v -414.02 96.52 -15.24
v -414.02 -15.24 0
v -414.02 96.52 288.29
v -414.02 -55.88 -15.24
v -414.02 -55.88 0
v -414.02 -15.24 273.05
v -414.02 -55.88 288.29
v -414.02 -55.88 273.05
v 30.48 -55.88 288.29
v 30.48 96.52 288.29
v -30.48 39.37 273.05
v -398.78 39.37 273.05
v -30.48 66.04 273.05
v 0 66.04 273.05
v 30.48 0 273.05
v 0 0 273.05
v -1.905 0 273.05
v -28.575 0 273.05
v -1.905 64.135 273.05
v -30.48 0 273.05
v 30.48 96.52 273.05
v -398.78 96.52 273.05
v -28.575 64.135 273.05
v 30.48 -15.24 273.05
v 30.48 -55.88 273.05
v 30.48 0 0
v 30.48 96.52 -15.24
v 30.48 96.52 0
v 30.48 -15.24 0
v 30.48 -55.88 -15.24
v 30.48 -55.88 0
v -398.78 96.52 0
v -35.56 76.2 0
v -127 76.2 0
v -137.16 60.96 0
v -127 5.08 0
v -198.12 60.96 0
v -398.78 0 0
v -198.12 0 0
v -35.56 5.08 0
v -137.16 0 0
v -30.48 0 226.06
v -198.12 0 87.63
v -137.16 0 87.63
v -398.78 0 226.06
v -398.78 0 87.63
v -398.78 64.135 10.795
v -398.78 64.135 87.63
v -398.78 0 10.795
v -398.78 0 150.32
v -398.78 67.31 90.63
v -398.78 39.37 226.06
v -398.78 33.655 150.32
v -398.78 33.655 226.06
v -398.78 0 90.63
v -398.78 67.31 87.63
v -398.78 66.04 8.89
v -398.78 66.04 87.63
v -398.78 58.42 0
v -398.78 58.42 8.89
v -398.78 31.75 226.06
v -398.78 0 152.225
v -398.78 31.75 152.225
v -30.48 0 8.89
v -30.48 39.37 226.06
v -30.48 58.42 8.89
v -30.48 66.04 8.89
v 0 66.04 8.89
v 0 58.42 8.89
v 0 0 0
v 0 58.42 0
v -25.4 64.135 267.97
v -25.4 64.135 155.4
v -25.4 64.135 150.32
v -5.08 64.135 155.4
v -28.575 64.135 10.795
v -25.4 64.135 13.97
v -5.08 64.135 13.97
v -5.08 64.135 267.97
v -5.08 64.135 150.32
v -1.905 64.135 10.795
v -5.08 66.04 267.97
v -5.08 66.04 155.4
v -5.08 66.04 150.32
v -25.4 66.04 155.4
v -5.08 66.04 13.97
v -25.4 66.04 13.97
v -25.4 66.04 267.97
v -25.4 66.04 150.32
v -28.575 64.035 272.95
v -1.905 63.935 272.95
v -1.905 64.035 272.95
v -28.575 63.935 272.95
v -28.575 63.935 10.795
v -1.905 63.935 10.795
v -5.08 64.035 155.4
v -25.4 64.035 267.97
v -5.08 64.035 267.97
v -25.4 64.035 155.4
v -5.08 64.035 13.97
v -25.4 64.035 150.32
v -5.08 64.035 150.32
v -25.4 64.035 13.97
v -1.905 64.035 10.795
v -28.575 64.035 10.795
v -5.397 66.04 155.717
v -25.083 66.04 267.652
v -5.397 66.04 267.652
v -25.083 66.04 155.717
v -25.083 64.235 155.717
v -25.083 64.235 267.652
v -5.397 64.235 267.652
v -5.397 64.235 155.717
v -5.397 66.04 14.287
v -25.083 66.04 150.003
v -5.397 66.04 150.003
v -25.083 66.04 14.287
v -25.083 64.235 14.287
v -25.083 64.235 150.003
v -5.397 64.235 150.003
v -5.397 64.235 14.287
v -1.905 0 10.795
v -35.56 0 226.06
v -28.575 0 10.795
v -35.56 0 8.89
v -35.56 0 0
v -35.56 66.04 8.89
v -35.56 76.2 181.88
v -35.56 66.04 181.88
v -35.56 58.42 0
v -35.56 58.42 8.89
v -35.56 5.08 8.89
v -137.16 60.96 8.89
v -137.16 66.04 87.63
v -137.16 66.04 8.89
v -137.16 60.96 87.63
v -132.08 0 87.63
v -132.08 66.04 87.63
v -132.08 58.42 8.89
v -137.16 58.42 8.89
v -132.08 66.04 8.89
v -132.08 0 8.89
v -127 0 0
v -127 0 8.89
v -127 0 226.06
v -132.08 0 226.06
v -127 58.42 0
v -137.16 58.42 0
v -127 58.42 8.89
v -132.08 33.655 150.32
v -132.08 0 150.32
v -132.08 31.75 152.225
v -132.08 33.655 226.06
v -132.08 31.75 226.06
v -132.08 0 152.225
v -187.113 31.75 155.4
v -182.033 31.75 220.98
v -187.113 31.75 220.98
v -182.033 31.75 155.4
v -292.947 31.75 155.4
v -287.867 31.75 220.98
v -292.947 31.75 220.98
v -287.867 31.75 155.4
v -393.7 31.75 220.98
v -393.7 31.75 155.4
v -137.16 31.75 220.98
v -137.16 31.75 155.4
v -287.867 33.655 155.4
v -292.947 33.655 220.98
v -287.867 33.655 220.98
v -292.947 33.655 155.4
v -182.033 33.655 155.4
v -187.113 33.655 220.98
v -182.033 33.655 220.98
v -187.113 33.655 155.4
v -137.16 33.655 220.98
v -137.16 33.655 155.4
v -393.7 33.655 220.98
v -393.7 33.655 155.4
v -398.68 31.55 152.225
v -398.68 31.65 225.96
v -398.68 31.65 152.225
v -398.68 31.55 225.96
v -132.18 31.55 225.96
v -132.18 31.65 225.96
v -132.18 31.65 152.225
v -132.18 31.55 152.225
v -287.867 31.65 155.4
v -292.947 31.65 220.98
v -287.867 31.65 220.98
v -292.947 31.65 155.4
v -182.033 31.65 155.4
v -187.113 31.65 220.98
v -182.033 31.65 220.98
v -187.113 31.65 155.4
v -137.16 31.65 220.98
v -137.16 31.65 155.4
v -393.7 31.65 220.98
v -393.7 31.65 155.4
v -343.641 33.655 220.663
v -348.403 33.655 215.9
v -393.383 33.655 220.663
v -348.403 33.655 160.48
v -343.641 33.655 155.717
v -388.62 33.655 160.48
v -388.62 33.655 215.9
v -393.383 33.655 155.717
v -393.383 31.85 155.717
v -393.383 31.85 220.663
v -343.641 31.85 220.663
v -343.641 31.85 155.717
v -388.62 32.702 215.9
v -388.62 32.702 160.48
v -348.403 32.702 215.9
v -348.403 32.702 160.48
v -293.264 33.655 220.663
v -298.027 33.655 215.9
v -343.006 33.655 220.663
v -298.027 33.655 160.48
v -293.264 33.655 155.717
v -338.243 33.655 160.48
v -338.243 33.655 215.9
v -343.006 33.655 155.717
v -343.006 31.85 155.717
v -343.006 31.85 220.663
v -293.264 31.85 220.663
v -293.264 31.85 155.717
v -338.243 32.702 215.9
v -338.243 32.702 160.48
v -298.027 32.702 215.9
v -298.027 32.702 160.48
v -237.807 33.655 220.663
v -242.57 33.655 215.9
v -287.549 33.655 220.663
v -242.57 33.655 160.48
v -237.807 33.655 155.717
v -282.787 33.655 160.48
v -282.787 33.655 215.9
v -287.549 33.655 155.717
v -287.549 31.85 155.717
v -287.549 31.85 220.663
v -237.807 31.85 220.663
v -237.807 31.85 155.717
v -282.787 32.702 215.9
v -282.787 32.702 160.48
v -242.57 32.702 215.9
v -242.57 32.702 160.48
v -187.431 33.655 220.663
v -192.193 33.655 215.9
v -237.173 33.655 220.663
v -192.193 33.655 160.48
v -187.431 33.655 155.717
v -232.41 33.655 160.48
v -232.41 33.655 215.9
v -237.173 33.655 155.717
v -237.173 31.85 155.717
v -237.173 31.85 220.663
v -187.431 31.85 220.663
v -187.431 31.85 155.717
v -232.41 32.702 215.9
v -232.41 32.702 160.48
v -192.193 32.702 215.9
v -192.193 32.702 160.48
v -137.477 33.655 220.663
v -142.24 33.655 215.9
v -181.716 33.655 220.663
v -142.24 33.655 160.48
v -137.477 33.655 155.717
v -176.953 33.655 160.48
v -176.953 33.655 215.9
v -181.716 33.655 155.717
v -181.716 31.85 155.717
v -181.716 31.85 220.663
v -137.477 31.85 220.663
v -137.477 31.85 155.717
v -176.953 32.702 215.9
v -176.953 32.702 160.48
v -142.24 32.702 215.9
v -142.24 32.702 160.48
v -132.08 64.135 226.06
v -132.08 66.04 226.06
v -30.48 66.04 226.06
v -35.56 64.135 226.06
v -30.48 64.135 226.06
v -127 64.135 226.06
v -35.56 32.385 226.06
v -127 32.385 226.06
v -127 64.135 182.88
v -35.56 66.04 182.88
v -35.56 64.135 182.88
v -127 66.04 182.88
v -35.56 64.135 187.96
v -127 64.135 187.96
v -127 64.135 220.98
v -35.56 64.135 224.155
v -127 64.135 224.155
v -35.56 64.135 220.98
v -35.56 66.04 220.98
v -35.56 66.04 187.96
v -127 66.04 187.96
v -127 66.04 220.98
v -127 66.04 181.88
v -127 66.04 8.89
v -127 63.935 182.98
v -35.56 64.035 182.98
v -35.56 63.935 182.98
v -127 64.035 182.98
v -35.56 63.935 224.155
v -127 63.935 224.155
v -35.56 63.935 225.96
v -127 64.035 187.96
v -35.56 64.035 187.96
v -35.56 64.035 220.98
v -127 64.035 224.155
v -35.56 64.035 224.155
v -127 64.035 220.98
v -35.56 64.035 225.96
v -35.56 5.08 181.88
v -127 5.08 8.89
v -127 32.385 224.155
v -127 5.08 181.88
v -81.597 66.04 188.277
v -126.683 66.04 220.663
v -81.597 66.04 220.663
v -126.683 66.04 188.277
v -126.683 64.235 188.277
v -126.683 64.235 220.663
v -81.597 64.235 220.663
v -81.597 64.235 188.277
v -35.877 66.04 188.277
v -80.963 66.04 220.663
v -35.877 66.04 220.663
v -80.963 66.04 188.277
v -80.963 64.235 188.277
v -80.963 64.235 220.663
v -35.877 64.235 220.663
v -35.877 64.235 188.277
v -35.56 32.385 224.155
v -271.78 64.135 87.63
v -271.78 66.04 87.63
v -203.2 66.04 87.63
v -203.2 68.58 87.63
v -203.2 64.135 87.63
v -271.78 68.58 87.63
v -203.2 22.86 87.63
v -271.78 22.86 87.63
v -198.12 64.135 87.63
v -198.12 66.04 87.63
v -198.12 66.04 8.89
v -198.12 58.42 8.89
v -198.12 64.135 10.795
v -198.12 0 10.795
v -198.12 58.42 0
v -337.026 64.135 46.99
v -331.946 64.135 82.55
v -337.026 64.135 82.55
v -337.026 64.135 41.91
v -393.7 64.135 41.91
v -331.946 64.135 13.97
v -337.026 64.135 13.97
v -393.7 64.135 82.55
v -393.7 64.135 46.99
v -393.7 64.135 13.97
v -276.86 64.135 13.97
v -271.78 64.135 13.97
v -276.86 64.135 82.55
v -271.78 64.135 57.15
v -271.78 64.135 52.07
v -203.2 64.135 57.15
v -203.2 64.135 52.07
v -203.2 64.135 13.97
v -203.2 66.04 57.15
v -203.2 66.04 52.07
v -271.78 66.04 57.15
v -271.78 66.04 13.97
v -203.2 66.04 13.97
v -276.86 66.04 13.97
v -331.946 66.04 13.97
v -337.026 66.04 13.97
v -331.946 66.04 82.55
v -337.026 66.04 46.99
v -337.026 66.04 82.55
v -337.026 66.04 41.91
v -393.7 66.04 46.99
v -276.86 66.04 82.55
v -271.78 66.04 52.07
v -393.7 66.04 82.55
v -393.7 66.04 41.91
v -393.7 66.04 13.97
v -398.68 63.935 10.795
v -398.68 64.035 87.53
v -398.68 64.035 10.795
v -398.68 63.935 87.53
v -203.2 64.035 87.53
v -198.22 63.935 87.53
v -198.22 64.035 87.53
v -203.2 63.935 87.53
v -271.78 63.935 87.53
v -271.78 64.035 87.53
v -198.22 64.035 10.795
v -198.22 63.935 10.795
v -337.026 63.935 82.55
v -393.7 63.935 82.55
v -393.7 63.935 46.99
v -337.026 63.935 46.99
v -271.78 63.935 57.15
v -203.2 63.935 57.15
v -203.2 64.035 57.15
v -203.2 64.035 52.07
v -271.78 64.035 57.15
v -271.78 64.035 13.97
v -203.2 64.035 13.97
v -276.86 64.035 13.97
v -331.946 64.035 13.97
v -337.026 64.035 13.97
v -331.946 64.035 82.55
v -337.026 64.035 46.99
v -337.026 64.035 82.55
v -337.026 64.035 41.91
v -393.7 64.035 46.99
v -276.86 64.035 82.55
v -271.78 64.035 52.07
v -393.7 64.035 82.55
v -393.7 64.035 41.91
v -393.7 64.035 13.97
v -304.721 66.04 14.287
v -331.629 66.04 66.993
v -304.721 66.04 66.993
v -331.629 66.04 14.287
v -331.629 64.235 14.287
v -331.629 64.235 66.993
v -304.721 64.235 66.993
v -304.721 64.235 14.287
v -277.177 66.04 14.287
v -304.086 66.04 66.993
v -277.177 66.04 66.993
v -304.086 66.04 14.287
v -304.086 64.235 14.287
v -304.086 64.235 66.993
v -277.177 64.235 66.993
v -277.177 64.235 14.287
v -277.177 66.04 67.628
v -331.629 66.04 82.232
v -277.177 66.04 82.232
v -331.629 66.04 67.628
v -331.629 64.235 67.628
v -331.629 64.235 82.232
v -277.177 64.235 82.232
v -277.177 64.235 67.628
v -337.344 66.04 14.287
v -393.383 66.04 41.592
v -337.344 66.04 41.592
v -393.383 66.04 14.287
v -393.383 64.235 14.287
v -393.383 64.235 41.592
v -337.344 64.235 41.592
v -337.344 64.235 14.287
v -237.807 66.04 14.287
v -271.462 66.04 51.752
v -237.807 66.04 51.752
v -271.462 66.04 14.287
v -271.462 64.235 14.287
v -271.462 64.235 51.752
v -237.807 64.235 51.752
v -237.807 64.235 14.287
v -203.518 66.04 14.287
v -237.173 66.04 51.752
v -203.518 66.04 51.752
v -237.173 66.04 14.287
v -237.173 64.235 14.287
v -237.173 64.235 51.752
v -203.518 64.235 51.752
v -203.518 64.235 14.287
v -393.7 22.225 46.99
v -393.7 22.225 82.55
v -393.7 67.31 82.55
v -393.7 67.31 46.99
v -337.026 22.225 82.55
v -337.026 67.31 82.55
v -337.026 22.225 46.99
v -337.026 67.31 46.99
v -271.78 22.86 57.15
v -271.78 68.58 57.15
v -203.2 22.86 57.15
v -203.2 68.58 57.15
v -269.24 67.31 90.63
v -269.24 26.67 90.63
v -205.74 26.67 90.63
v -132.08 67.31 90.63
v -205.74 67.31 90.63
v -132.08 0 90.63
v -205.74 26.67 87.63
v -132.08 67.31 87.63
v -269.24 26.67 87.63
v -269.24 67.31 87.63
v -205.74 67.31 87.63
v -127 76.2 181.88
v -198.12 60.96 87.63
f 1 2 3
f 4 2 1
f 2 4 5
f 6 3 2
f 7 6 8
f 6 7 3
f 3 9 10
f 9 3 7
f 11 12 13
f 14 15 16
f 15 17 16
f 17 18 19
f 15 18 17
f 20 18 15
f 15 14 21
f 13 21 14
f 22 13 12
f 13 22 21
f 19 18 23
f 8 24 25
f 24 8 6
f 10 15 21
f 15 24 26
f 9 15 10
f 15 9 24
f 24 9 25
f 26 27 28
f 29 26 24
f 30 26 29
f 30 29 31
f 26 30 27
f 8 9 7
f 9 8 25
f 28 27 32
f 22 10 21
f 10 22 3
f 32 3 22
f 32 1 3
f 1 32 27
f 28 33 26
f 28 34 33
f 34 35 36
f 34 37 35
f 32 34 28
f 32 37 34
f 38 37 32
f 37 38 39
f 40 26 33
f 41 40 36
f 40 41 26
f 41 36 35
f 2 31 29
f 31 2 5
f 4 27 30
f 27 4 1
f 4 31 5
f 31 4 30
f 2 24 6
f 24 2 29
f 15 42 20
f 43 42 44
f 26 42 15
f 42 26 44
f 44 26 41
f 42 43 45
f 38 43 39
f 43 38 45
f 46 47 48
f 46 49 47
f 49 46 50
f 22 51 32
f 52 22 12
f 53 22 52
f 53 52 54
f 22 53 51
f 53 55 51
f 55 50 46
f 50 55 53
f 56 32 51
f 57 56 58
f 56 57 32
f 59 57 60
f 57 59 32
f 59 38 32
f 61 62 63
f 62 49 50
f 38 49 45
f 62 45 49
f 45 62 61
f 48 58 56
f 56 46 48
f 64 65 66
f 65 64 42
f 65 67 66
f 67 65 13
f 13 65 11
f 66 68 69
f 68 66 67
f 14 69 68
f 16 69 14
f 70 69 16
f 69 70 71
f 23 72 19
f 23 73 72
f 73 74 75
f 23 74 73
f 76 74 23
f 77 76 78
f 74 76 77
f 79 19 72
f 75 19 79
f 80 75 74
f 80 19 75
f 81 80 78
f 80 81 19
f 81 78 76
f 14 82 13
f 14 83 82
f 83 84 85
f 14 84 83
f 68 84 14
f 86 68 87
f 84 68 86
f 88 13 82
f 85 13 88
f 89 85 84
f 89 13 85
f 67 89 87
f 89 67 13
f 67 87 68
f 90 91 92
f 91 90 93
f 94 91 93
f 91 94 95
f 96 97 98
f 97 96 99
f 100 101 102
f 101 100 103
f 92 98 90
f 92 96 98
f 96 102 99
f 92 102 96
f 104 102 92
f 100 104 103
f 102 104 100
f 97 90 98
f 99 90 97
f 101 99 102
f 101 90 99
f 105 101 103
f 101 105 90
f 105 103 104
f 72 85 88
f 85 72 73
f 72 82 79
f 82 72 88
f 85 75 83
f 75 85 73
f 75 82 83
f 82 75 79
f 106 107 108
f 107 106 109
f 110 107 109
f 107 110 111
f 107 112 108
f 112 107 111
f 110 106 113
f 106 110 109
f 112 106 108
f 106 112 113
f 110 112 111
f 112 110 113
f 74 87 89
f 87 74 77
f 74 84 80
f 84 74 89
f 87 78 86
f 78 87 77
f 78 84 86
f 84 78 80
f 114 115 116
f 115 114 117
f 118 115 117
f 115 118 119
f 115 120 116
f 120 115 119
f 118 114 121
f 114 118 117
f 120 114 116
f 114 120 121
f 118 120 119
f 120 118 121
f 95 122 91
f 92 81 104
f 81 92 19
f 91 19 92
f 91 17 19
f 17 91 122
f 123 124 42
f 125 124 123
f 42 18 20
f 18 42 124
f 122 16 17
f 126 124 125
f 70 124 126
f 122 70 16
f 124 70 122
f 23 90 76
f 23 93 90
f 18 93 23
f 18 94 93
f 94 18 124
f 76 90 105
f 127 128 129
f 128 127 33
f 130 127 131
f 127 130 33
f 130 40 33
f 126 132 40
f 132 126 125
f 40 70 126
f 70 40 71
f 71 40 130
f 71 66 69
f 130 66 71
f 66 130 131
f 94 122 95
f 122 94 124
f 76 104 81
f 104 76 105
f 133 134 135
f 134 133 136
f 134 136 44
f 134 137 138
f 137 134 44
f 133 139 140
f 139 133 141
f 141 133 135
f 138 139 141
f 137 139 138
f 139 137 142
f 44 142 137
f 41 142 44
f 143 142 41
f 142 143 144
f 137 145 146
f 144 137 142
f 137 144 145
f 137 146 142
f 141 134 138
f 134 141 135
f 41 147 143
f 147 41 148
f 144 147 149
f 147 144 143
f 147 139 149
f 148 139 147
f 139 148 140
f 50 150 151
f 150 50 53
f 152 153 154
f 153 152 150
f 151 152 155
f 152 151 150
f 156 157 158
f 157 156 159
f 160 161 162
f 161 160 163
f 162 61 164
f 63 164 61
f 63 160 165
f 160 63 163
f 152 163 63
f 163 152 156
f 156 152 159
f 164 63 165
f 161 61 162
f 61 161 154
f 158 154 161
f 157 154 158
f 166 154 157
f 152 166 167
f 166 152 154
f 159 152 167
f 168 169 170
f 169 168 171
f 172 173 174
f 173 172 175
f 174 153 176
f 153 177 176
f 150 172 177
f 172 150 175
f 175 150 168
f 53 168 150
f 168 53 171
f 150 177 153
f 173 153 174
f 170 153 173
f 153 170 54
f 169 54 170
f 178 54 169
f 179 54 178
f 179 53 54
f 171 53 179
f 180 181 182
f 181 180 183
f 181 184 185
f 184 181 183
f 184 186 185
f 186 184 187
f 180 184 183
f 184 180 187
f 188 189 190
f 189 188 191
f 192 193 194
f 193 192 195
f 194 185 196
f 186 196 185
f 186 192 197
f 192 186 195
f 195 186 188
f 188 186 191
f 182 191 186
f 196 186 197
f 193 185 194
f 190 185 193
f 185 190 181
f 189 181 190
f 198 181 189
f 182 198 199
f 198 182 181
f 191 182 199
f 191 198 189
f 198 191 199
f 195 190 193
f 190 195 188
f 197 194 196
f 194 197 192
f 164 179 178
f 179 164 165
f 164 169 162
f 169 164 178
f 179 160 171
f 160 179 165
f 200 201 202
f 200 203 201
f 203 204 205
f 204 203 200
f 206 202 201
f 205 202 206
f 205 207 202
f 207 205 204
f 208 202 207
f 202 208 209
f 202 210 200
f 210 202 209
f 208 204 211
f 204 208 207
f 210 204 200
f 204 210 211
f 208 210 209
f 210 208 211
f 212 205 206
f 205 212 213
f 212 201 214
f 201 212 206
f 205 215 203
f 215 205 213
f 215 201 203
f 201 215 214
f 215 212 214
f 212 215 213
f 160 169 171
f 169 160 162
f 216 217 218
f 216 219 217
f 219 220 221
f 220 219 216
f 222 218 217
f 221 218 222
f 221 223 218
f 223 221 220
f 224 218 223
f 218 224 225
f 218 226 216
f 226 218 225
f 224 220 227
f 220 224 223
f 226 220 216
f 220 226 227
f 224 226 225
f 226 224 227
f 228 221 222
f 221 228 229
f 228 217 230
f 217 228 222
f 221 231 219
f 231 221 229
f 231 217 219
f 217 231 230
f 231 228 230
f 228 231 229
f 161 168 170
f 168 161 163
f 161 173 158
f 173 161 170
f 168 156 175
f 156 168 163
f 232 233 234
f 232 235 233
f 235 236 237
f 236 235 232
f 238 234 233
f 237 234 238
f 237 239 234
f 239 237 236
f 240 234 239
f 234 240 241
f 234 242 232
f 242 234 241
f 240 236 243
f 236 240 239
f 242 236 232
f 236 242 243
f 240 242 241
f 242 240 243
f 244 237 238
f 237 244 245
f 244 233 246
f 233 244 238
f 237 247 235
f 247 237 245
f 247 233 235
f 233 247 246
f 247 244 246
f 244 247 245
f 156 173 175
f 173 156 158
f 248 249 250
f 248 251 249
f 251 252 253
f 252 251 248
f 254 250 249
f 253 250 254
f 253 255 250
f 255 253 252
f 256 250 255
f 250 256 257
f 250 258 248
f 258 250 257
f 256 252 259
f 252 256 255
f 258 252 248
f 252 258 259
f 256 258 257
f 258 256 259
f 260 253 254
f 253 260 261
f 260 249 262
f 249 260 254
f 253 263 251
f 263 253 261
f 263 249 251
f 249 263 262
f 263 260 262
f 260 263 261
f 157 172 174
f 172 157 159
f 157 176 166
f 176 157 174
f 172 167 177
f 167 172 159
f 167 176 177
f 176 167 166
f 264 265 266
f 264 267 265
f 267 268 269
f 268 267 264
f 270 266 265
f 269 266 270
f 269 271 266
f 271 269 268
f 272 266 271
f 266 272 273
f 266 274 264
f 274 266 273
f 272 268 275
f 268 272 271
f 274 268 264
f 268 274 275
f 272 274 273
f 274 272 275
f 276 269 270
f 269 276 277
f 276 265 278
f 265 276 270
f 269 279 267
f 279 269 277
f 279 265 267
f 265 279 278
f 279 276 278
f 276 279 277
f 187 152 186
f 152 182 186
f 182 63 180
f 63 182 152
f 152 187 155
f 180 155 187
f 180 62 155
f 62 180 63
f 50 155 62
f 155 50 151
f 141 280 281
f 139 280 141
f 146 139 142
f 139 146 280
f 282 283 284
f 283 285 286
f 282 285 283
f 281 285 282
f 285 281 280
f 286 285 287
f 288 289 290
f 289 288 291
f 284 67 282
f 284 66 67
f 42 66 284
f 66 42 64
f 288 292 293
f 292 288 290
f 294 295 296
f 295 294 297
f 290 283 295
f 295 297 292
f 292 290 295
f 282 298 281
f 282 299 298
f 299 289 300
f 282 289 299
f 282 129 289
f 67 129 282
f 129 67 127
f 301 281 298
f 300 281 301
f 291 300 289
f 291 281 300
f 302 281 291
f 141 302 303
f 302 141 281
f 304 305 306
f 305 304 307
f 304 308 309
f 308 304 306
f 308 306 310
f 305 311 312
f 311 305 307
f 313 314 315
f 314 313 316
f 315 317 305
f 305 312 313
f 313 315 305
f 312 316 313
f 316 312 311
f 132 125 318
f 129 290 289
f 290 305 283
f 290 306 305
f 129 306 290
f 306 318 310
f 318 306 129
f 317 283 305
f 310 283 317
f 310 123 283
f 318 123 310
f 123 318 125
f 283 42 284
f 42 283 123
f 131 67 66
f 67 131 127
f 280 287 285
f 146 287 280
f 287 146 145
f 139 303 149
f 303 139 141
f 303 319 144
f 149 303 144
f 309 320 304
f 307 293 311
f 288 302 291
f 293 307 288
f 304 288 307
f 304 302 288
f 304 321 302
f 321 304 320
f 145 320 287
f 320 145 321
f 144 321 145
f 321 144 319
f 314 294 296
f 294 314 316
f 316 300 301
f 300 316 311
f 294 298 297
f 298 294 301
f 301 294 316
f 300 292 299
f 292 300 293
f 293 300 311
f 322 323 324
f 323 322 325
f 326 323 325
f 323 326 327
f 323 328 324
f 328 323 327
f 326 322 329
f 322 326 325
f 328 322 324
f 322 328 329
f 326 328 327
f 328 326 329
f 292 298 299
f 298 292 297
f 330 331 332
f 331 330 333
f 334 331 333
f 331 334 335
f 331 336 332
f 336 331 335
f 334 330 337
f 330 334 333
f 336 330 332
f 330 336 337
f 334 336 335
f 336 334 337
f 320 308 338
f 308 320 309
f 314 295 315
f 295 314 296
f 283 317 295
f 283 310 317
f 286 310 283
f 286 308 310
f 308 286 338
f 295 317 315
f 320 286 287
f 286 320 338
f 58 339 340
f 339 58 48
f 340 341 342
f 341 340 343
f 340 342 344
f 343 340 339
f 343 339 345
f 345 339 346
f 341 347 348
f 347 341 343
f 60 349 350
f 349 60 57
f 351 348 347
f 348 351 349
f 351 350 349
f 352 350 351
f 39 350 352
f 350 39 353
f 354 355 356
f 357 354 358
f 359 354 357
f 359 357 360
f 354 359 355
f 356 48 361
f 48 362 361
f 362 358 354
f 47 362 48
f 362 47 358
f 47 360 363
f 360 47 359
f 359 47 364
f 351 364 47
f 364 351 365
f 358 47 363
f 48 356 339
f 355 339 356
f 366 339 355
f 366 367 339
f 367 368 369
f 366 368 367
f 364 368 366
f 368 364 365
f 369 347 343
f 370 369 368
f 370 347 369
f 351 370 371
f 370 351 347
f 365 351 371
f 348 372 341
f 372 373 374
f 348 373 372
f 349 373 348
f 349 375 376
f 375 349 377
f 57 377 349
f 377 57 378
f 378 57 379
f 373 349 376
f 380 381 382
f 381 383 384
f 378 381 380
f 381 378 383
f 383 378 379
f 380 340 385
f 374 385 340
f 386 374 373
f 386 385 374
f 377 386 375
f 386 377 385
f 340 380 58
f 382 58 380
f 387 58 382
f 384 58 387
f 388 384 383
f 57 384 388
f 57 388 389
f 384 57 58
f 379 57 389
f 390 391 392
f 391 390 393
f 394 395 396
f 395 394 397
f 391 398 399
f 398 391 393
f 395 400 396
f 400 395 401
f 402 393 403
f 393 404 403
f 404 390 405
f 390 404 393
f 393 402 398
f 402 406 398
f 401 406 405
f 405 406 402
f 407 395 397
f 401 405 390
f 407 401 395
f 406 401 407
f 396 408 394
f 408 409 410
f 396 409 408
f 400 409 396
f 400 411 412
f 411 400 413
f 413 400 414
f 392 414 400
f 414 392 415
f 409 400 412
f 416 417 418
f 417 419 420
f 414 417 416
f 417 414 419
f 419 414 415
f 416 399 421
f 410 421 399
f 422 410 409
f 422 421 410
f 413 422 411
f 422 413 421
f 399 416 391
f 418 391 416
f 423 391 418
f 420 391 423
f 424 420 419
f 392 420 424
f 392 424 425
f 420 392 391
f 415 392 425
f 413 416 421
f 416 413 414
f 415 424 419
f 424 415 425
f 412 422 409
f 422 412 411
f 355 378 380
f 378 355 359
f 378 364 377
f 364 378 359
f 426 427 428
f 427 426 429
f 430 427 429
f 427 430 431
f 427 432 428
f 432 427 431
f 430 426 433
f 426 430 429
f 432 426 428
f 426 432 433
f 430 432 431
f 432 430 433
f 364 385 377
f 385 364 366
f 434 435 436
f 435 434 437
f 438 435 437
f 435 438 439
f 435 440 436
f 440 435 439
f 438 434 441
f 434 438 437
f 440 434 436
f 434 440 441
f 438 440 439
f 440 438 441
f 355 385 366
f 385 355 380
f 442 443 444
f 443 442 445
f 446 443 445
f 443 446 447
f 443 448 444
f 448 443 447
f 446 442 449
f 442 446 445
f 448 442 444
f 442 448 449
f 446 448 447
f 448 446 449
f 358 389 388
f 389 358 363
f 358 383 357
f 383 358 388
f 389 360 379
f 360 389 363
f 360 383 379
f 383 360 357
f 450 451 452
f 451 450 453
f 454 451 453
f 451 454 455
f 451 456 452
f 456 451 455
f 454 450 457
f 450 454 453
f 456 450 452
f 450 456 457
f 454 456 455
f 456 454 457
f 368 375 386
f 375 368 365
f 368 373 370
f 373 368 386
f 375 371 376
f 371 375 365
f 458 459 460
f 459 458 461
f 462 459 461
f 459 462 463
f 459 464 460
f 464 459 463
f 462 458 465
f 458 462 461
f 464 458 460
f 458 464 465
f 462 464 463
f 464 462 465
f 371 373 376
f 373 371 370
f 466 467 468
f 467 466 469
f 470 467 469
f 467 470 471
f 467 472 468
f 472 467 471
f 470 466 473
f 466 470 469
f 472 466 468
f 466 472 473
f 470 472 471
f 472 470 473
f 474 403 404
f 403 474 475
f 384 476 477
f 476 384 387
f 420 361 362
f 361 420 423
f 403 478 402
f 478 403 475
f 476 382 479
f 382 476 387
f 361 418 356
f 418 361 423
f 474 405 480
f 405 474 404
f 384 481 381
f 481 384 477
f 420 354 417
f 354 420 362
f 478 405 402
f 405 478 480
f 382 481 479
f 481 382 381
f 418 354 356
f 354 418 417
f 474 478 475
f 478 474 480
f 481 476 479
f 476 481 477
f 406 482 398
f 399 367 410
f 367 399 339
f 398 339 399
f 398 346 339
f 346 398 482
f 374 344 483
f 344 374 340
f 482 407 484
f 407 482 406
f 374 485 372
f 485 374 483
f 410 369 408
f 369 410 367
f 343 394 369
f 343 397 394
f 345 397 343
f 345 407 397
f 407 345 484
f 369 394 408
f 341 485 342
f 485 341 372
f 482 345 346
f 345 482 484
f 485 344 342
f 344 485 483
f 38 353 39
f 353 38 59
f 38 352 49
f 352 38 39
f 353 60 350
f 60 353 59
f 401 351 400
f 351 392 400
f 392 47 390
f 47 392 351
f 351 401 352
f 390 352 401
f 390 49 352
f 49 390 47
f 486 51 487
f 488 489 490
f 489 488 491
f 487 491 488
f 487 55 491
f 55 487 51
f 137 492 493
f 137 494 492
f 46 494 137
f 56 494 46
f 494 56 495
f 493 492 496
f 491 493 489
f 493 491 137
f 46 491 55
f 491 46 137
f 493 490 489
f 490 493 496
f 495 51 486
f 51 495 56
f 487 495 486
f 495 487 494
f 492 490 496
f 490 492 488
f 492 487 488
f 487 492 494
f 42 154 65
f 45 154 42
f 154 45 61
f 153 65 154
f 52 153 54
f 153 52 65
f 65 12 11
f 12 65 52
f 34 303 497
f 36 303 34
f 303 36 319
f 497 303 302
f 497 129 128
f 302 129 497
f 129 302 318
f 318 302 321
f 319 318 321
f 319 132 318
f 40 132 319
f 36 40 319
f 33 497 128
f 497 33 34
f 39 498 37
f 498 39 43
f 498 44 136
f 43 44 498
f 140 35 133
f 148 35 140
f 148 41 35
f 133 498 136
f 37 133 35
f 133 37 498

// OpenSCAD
function mm(x) = x/10;
function cm(x) = x;
function in(x) = x*2.54;
function ft(x,i=0) = in(x*12+i);

epsilon = mm(1);
explode_gap = mm(0);

pantry_width = in(12);
fridge_width = in(36);
fridge_cabinet_width = fridge_width + in(4);
fridge_height = in(72);
fridge_depth = in(28);
dishwasher_width = in(24);
dishwasher_depth = in(24);
dishwasher_wall_thickness = in(2);
cabinet_face_thickness = in(3/4);
lower_cabinet_face_height = in(31);
cabinet_kick_height = in(3.5);
lower_cabinet_depth = in(26);
lower_cabinet_height = in(24);
upper_cabinet_depth = in(13.25);
ceiling_height = in(107.5);
soffit_height = in(18.5);
soffit_width = in(145);  // actually 145.5, but allowing the pantry to overlap .5 in.
total_width = soffit_width + in(12);
soffit_depth = in(15.5);
wall_thickness = in(6);
wall_reveal = in(12);
sink_width = in(27);
sink_cabinet_width = in(27);
sink_depth = in(18);
sink_height = in(12);
speedoven_width = in(22+5/16);
speedoven_depth = in(17+3/4);
speedoven_height = in(14);
countertop_depth = lower_cabinet_depth + in(1/2);
countertop_thickness = cm(3);
upper_cabinet_face_height = ceiling_height - soffit_height - (cabinet_kick_height + lower_cabinet_face_height + cm(3) + in(23.5));
echo(upper_cabinet_face_height=upper_cabinet_face_height/in(1));
upper_fridge_cabinet_face_height = ceiling_height - soffit_height - fridge_height;
echo(upper_fridge_cabinet_face_height=upper_fridge_cabinet_face_height/in(1));

speedoven_xoffset = total_width - fridge_cabinet_width - dishwasher_wall_thickness - dishwasher_width - pantry_width - in(2) - speedoven_width;

lightwalnut = [0.397, 0.315, 0.228];
darkwalnut = [0.397*0.85, 0.315*0.85, 0.228*0.85];

module soffit() {
    translate([pantry_width, -soffit_depth, ceiling_height - soffit_height]) {
        color("lightgray") cube([soffit_width, soffit_depth, soffit_height]);
    }
}

module walls() {
    translate([-wall_reveal, -lower_cabinet_depth - wall_reveal, ceiling_height]) {
        color("lightgray") cube([wall_reveal + total_width + wall_thickness, ft(5), wall_thickness]);
    }
    translate([-wall_reveal, -lower_cabinet_depth - wall_reveal, -wall_thickness]) {
        color("lightgray") cube([wall_reveal + total_width + wall_thickness, ft(5), wall_thickness]);
    }
    translate([-wall_reveal, 0, 0]) {
        color("lightgray") cube([wall_reveal + total_width + wall_thickness, wall_thickness, ceiling_height]);
    }
    translate([total_width, -(lower_cabinet_depth + wall_reveal), 0]) {
        color("lightgray") cube([wall_thickness, lower_cabinet_depth + wall_reveal, ceiling_height]);
    }
}

module fridge() {
    translate([pantry_width + in(2), -fridge_depth - in(2), 0]) {
        color("gray") cube([fridge_width, fridge_depth, fridge_height - 1]);
    }
}

module dishwasher() {
    translate([pantry_width + fridge_cabinet_width + dishwasher_wall_thickness, -dishwasher_depth, 0]) {
        color("gray") cube([dishwasher_width, dishwasher_depth, cabinet_kick_height + lower_cabinet_face_height]);
    }
}

module sink() {
    difference() {
        children();
        translate([in(2) + (sink_cabinet_width - sink_width)/2, -in(1), lower_cabinet_face_height - sink_height]) {
            color(lightwalnut) cube([sink_width, sink_depth, sink_height + epsilon]);
        }
    }
    translate([in(2) + (sink_cabinet_width - sink_width)/2, -in(1), lower_cabinet_face_height - sink_height]) {
        color("gray") cube([sink_width, sink_depth, sink_height]);
    }
}

module speedoven() {
    yoffset = lower_cabinet_face_height - speedoven_height - in(2);
    difference() {
        children();
        translate([speedoven_xoffset, -in(1/2), yoffset]) {
            color(lightwalnut) cube([speedoven_width, speedoven_depth, speedoven_height]);
        }
    }
    translate([speedoven_xoffset, -in(1/2), yoffset]) {
        color("gray") cube([speedoven_width, speedoven_depth, speedoven_height]);
    }
}

module countertop() {
    translate([pantry_width + fridge_cabinet_width, -countertop_depth, cabinet_kick_height + lower_cabinet_face_height]) {
        color("gray") {
            difference() {
                cube([total_width - pantry_width - fridge_cabinet_width, countertop_depth, countertop_thickness]);
                translate([dishwasher_wall_thickness + dishwasher_width + in(2) + in(1), -in(1), -epsilon]) {
                    cube([sink_width - 2*in(1), sink_depth - in(1), countertop_thickness + 2*epsilon]);
                }
            }
        }
    }
}

module dishwasher_wall() {
    translate([pantry_width + fridge_cabinet_width, -lower_cabinet_depth, cabinet_kick_height]) {
        color(lightwalnut) cube([dishwasher_wall_thickness, lower_cabinet_depth, lower_cabinet_face_height]);

        translate([-in(2), in(3), -cabinet_kick_height])
        color(darkwalnut) cube([in(2) + dishwasher_wall_thickness, lower_cabinet_depth - in(3), cabinet_kick_height]);
    }
}

cabinet_door_gap = in(1/8);

module cabinet_door(xoffset, yoffset, width, height) {
    echo(width=width/in(1),height=height/in(1))
    difference() {
        children();
        translate([xoffset, -epsilon, yoffset]) {
            color("black") cube([width, cabinet_face_thickness + 2*epsilon, height]);
        }
    }
    translate([xoffset + cabinet_door_gap/2, 0, yoffset + cabinet_door_gap/2]) {
        intersection() {
            color(lightwalnut) cube([width - cabinet_door_gap/2, cabinet_face_thickness, height - cabinet_door_gap / 2]);
            translate([cabinet_door_gap/2, -epsilon, cabinet_door_gap/2]) {
                color("black") cube([width - 2*cabinet_door_gap, cabinet_face_thickness, height - 2*cabinet_door_gap]);
            }
        }
    }
}

module glass_cabinet_door(xoffset, yoffset, width, height) {
    difference() {
        cabinet_door(xoffset, yoffset, width, height) {
            children();
        }
        translate([xoffset + in(2), -epsilon, yoffset + in(2)]) {
            color("black") cube([width - 2*in(2), cabinet_face_thickness/2 + epsilon, height - 2*in(2)]);
        }
    }
}

module cabinets_face(width, height) {
    color(lightwalnut) cube([width, cabinet_face_thickness, height]);
    color("black") translate([epsilon, cabinet_face_thickness + epsilon, epsilon]) cube([width - 2*epsilon, epsilon, height - 2*epsilon]);
}

module pantry() {
    translate([0, -lower_cabinet_depth, cabinet_kick_height]) {
        color(lightwalnut) cube([cabinet_face_thickness, lower_cabinet_depth, ceiling_height - cabinet_kick_height]);
        translate([pantry_width - cabinet_face_thickness, 0, 0]) {
            color(lightwalnut) cube([cabinet_face_thickness, lower_cabinet_depth, ceiling_height - cabinet_kick_height]);
        }
        cabinet_door(in(2), in(2), pantry_width - 2*in(2), ceiling_height - soffit_height - upper_cabinet_face_height - cabinet_kick_height - in(2))
        cabinet_door(in(2), ceiling_height - soffit_height - upper_cabinet_face_height - cabinet_kick_height + in(2), pantry_width - 2*in(2), upper_cabinet_face_height + soffit_height - 2*in(2))
        cabinets_face(pantry_width, ceiling_height - cabinet_kick_height);

        translate([0, in(3), -cabinet_kick_height])
        color(darkwalnut) cube([pantry_width + in(2), lower_cabinet_depth - in(3), cabinet_kick_height]);

        color(lightwalnut) cube([pantry_width, lower_cabinet_depth, cabinet_face_thickness]);
    }
}

module lower_cabinets_face() {
    translate([pantry_width + fridge_cabinet_width + dishwasher_wall_thickness + dishwasher_width, -lower_cabinet_depth, cabinet_kick_height]) {
        sink()
        speedoven()
        cabinet_door(in(2), in(2), sink_cabinet_width/2, lower_cabinet_face_height - sink_height - 2*in(2))
        cabinet_door(in(2) + sink_cabinet_width/2, in(2), sink_cabinet_width/2, lower_cabinet_face_height - sink_height - 2*in(2))
        cabinet_door(speedoven_xoffset, in(2), speedoven_width, lower_cabinet_face_height - speedoven_height - 3*in(2))
        cabinet_door(sink_cabinet_width + 2*in(2), lower_cabinet_face_height - in(2) - in(6), speedoven_xoffset - sink_cabinet_width - 3*in(2), in(6))
        cabinet_door(sink_cabinet_width + 2*in(2), in(2), (speedoven_xoffset - sink_cabinet_width - 3*in(2)) / 2, lower_cabinet_face_height - in(6) - 2*in(2))
        cabinet_door(sink_cabinet_width + 2*in(2) + (speedoven_xoffset - sink_cabinet_width - 3*in(2)) / 2, in(2), (speedoven_xoffset - sink_cabinet_width - 3*in(2)) / 2, lower_cabinet_face_height - in(6) - 2*in(2))
        cabinets_face(total_width - pantry_width - fridge_cabinet_width - dishwasher_wall_thickness - dishwasher_width, lower_cabinet_face_height);

        translate([0, in(3), -cabinet_kick_height])
        color(darkwalnut) cube([total_width - pantry_width - fridge_cabinet_width - dishwasher_wall_thickness - dishwasher_width, lower_cabinet_depth - in(3), cabinet_kick_height]);

        color(lightwalnut) cube([total_width - pantry_width - fridge_cabinet_width - dishwasher_wall_thickness - dishwasher_width, lower_cabinet_depth, cabinet_face_thickness]);
    }
}

module upper_cabinets_face() {
    //dishwasher_upper_door_width = (total_width - pantry_width - fridge_cabinet_width - dishwasher_wall_thickness - 3*in(2)) / 5;
    //sink_upper_door_width = dishwasher_upper_door_width;
    //counter_upper_door_width = sink_upper_door_width;
    //speedoven_upper_door_width = sink_upper_door_width;
    sink_upper_door_width = (total_width - pantry_width - fridge_cabinet_width - dishwasher_wall_thickness - dishwasher_width - in(2) - sink_cabinet_width/2 - 2*in(2)) / 3;
    dishwasher_upper_door_width = dishwasher_width + sink_cabinet_width/2 - sink_upper_door_width;
    counter_upper_door_width = sink_upper_door_width;
    speedoven_upper_door_width = sink_upper_door_width;
    translate([pantry_width + fridge_cabinet_width, -upper_cabinet_depth, ceiling_height - soffit_height - upper_cabinet_face_height]) {
        glass_cabinet_door(dishwasher_wall_thickness, in(2), dishwasher_upper_door_width, upper_cabinet_face_height - 2*in(2))
        glass_cabinet_door(dishwasher_wall_thickness + dishwasher_upper_door_width + in(2), in(2), sink_upper_door_width, upper_cabinet_face_height - 2*in(2))
        glass_cabinet_door(dishwasher_wall_thickness + dishwasher_upper_door_width + in(2) + sink_upper_door_width, in(2), sink_upper_door_width, upper_cabinet_face_height - 2*in(2))
        glass_cabinet_door(dishwasher_wall_thickness + dishwasher_upper_door_width + in(2) + 2*sink_upper_door_width + in(2), in(2), counter_upper_door_width, upper_cabinet_face_height - 2*in(2))
        glass_cabinet_door(dishwasher_wall_thickness + dishwasher_upper_door_width + in(2) + 2*sink_upper_door_width + in(2) + counter_upper_door_width, in(2), speedoven_upper_door_width, upper_cabinet_face_height - 2*in(2))
//        glass_cabinet_door(dishwasher_wall_thickness, in(2), dishwasher_width/2, upper_cabinet_face_height - 2*in(2))
//        glass_cabinet_door(dishwasher_wall_thickness + dishwasher_width/2, in(2), dishwasher_width/2, upper_cabinet_face_height - 2*in(2))
//        glass_cabinet_door(dishwasher_wall_thickness + dishwasher_width + in(2), in(2), sink_cabinet_width/2, upper_cabinet_face_height - 2*in(2))
//        glass_cabinet_door(dishwasher_wall_thickness + dishwasher_width + in(2) + sink_cabinet_width/2, in(2), sink_cabinet_width/2, upper_cabinet_face_height - 2*in(2))
//        glass_cabinet_door(dishwasher_wall_thickness + dishwasher_width + in(2) + sink_cabinet_width + in(2), in(2), in(11.365), upper_cabinet_face_height - 2*in(2))
//        glass_cabinet_door(dishwasher_wall_thickness + dishwasher_width + in(2) + sink_cabinet_width + in(2) + in(11.365), in(2), in(11.365), upper_cabinet_face_height - 2*in(2))
//        glass_cabinet_door(dishwasher_wall_thickness + dishwasher_width + speedoven_xoffset, in(2), speedoven_width/2, upper_cabinet_face_height - 2*in(2))
//        glass_cabinet_door(dishwasher_wall_thickness + dishwasher_width + speedoven_xoffset + speedoven_width/2, in(2), speedoven_width/2, upper_cabinet_face_height - 2*in(2))
        cabinets_face(total_width - pantry_width - fridge_cabinet_width, upper_cabinet_face_height);

        color(lightwalnut) cube([total_width - pantry_width - fridge_cabinet_width, upper_cabinet_depth, cabinet_face_thickness]);
    }
}

//upper_fridge_cabinet_depth = soffit_depth;
//upper_fridge_cabinet_depth = upper_cabinet_depth;
upper_fridge_cabinet_depth = lower_cabinet_depth;

module upper_fridge_cabinets_face() {
    translate([pantry_width + in(2), -upper_fridge_cabinet_depth, ceiling_height - soffit_height - upper_fridge_cabinet_face_height]) {
        cabinet_door(0, in(2), fridge_width/2, upper_fridge_cabinet_face_height - 2*in(2))
        cabinet_door(fridge_width/2, in(2), fridge_width/2, upper_fridge_cabinet_face_height - 2*in(2))
        union() {
            translate([-in(2), 0, 0]) {
                cabinets_face(fridge_cabinet_width, upper_fridge_cabinet_face_height);
                translate([0, upper_fridge_cabinet_depth-lower_cabinet_depth, cabinet_kick_height - (ceiling_height - soffit_height - upper_fridge_cabinet_face_height)]) {
                    color(lightwalnut) cube([in(2), lower_cabinet_depth, ceiling_height - soffit_height - cabinet_kick_height]);
                    translate([fridge_width + in(2), 0, 0]) {
                        color(lightwalnut) cube([in(2), lower_cabinet_depth, ceiling_height - soffit_height - cabinet_kick_height]);
                    }
                }
            }
        }

        translate([0, 0, upper_fridge_cabinet_face_height - cabinet_face_thickness]) {
            color(lightwalnut) cube([fridge_width, upper_cabinet_depth, cabinet_face_thickness]);
        }
    }

}

echo(upper_cabinet_face_height=upper_cabinet_face_height/in(1));

rotate([0, 0, 180]) {
walls();
soffit();
pantry();
fridge();
dishwasher_wall();
dishwasher();
upper_cabinets_face();
upper_fridge_cabinets_face();
lower_cabinets_face();
countertop();
}
